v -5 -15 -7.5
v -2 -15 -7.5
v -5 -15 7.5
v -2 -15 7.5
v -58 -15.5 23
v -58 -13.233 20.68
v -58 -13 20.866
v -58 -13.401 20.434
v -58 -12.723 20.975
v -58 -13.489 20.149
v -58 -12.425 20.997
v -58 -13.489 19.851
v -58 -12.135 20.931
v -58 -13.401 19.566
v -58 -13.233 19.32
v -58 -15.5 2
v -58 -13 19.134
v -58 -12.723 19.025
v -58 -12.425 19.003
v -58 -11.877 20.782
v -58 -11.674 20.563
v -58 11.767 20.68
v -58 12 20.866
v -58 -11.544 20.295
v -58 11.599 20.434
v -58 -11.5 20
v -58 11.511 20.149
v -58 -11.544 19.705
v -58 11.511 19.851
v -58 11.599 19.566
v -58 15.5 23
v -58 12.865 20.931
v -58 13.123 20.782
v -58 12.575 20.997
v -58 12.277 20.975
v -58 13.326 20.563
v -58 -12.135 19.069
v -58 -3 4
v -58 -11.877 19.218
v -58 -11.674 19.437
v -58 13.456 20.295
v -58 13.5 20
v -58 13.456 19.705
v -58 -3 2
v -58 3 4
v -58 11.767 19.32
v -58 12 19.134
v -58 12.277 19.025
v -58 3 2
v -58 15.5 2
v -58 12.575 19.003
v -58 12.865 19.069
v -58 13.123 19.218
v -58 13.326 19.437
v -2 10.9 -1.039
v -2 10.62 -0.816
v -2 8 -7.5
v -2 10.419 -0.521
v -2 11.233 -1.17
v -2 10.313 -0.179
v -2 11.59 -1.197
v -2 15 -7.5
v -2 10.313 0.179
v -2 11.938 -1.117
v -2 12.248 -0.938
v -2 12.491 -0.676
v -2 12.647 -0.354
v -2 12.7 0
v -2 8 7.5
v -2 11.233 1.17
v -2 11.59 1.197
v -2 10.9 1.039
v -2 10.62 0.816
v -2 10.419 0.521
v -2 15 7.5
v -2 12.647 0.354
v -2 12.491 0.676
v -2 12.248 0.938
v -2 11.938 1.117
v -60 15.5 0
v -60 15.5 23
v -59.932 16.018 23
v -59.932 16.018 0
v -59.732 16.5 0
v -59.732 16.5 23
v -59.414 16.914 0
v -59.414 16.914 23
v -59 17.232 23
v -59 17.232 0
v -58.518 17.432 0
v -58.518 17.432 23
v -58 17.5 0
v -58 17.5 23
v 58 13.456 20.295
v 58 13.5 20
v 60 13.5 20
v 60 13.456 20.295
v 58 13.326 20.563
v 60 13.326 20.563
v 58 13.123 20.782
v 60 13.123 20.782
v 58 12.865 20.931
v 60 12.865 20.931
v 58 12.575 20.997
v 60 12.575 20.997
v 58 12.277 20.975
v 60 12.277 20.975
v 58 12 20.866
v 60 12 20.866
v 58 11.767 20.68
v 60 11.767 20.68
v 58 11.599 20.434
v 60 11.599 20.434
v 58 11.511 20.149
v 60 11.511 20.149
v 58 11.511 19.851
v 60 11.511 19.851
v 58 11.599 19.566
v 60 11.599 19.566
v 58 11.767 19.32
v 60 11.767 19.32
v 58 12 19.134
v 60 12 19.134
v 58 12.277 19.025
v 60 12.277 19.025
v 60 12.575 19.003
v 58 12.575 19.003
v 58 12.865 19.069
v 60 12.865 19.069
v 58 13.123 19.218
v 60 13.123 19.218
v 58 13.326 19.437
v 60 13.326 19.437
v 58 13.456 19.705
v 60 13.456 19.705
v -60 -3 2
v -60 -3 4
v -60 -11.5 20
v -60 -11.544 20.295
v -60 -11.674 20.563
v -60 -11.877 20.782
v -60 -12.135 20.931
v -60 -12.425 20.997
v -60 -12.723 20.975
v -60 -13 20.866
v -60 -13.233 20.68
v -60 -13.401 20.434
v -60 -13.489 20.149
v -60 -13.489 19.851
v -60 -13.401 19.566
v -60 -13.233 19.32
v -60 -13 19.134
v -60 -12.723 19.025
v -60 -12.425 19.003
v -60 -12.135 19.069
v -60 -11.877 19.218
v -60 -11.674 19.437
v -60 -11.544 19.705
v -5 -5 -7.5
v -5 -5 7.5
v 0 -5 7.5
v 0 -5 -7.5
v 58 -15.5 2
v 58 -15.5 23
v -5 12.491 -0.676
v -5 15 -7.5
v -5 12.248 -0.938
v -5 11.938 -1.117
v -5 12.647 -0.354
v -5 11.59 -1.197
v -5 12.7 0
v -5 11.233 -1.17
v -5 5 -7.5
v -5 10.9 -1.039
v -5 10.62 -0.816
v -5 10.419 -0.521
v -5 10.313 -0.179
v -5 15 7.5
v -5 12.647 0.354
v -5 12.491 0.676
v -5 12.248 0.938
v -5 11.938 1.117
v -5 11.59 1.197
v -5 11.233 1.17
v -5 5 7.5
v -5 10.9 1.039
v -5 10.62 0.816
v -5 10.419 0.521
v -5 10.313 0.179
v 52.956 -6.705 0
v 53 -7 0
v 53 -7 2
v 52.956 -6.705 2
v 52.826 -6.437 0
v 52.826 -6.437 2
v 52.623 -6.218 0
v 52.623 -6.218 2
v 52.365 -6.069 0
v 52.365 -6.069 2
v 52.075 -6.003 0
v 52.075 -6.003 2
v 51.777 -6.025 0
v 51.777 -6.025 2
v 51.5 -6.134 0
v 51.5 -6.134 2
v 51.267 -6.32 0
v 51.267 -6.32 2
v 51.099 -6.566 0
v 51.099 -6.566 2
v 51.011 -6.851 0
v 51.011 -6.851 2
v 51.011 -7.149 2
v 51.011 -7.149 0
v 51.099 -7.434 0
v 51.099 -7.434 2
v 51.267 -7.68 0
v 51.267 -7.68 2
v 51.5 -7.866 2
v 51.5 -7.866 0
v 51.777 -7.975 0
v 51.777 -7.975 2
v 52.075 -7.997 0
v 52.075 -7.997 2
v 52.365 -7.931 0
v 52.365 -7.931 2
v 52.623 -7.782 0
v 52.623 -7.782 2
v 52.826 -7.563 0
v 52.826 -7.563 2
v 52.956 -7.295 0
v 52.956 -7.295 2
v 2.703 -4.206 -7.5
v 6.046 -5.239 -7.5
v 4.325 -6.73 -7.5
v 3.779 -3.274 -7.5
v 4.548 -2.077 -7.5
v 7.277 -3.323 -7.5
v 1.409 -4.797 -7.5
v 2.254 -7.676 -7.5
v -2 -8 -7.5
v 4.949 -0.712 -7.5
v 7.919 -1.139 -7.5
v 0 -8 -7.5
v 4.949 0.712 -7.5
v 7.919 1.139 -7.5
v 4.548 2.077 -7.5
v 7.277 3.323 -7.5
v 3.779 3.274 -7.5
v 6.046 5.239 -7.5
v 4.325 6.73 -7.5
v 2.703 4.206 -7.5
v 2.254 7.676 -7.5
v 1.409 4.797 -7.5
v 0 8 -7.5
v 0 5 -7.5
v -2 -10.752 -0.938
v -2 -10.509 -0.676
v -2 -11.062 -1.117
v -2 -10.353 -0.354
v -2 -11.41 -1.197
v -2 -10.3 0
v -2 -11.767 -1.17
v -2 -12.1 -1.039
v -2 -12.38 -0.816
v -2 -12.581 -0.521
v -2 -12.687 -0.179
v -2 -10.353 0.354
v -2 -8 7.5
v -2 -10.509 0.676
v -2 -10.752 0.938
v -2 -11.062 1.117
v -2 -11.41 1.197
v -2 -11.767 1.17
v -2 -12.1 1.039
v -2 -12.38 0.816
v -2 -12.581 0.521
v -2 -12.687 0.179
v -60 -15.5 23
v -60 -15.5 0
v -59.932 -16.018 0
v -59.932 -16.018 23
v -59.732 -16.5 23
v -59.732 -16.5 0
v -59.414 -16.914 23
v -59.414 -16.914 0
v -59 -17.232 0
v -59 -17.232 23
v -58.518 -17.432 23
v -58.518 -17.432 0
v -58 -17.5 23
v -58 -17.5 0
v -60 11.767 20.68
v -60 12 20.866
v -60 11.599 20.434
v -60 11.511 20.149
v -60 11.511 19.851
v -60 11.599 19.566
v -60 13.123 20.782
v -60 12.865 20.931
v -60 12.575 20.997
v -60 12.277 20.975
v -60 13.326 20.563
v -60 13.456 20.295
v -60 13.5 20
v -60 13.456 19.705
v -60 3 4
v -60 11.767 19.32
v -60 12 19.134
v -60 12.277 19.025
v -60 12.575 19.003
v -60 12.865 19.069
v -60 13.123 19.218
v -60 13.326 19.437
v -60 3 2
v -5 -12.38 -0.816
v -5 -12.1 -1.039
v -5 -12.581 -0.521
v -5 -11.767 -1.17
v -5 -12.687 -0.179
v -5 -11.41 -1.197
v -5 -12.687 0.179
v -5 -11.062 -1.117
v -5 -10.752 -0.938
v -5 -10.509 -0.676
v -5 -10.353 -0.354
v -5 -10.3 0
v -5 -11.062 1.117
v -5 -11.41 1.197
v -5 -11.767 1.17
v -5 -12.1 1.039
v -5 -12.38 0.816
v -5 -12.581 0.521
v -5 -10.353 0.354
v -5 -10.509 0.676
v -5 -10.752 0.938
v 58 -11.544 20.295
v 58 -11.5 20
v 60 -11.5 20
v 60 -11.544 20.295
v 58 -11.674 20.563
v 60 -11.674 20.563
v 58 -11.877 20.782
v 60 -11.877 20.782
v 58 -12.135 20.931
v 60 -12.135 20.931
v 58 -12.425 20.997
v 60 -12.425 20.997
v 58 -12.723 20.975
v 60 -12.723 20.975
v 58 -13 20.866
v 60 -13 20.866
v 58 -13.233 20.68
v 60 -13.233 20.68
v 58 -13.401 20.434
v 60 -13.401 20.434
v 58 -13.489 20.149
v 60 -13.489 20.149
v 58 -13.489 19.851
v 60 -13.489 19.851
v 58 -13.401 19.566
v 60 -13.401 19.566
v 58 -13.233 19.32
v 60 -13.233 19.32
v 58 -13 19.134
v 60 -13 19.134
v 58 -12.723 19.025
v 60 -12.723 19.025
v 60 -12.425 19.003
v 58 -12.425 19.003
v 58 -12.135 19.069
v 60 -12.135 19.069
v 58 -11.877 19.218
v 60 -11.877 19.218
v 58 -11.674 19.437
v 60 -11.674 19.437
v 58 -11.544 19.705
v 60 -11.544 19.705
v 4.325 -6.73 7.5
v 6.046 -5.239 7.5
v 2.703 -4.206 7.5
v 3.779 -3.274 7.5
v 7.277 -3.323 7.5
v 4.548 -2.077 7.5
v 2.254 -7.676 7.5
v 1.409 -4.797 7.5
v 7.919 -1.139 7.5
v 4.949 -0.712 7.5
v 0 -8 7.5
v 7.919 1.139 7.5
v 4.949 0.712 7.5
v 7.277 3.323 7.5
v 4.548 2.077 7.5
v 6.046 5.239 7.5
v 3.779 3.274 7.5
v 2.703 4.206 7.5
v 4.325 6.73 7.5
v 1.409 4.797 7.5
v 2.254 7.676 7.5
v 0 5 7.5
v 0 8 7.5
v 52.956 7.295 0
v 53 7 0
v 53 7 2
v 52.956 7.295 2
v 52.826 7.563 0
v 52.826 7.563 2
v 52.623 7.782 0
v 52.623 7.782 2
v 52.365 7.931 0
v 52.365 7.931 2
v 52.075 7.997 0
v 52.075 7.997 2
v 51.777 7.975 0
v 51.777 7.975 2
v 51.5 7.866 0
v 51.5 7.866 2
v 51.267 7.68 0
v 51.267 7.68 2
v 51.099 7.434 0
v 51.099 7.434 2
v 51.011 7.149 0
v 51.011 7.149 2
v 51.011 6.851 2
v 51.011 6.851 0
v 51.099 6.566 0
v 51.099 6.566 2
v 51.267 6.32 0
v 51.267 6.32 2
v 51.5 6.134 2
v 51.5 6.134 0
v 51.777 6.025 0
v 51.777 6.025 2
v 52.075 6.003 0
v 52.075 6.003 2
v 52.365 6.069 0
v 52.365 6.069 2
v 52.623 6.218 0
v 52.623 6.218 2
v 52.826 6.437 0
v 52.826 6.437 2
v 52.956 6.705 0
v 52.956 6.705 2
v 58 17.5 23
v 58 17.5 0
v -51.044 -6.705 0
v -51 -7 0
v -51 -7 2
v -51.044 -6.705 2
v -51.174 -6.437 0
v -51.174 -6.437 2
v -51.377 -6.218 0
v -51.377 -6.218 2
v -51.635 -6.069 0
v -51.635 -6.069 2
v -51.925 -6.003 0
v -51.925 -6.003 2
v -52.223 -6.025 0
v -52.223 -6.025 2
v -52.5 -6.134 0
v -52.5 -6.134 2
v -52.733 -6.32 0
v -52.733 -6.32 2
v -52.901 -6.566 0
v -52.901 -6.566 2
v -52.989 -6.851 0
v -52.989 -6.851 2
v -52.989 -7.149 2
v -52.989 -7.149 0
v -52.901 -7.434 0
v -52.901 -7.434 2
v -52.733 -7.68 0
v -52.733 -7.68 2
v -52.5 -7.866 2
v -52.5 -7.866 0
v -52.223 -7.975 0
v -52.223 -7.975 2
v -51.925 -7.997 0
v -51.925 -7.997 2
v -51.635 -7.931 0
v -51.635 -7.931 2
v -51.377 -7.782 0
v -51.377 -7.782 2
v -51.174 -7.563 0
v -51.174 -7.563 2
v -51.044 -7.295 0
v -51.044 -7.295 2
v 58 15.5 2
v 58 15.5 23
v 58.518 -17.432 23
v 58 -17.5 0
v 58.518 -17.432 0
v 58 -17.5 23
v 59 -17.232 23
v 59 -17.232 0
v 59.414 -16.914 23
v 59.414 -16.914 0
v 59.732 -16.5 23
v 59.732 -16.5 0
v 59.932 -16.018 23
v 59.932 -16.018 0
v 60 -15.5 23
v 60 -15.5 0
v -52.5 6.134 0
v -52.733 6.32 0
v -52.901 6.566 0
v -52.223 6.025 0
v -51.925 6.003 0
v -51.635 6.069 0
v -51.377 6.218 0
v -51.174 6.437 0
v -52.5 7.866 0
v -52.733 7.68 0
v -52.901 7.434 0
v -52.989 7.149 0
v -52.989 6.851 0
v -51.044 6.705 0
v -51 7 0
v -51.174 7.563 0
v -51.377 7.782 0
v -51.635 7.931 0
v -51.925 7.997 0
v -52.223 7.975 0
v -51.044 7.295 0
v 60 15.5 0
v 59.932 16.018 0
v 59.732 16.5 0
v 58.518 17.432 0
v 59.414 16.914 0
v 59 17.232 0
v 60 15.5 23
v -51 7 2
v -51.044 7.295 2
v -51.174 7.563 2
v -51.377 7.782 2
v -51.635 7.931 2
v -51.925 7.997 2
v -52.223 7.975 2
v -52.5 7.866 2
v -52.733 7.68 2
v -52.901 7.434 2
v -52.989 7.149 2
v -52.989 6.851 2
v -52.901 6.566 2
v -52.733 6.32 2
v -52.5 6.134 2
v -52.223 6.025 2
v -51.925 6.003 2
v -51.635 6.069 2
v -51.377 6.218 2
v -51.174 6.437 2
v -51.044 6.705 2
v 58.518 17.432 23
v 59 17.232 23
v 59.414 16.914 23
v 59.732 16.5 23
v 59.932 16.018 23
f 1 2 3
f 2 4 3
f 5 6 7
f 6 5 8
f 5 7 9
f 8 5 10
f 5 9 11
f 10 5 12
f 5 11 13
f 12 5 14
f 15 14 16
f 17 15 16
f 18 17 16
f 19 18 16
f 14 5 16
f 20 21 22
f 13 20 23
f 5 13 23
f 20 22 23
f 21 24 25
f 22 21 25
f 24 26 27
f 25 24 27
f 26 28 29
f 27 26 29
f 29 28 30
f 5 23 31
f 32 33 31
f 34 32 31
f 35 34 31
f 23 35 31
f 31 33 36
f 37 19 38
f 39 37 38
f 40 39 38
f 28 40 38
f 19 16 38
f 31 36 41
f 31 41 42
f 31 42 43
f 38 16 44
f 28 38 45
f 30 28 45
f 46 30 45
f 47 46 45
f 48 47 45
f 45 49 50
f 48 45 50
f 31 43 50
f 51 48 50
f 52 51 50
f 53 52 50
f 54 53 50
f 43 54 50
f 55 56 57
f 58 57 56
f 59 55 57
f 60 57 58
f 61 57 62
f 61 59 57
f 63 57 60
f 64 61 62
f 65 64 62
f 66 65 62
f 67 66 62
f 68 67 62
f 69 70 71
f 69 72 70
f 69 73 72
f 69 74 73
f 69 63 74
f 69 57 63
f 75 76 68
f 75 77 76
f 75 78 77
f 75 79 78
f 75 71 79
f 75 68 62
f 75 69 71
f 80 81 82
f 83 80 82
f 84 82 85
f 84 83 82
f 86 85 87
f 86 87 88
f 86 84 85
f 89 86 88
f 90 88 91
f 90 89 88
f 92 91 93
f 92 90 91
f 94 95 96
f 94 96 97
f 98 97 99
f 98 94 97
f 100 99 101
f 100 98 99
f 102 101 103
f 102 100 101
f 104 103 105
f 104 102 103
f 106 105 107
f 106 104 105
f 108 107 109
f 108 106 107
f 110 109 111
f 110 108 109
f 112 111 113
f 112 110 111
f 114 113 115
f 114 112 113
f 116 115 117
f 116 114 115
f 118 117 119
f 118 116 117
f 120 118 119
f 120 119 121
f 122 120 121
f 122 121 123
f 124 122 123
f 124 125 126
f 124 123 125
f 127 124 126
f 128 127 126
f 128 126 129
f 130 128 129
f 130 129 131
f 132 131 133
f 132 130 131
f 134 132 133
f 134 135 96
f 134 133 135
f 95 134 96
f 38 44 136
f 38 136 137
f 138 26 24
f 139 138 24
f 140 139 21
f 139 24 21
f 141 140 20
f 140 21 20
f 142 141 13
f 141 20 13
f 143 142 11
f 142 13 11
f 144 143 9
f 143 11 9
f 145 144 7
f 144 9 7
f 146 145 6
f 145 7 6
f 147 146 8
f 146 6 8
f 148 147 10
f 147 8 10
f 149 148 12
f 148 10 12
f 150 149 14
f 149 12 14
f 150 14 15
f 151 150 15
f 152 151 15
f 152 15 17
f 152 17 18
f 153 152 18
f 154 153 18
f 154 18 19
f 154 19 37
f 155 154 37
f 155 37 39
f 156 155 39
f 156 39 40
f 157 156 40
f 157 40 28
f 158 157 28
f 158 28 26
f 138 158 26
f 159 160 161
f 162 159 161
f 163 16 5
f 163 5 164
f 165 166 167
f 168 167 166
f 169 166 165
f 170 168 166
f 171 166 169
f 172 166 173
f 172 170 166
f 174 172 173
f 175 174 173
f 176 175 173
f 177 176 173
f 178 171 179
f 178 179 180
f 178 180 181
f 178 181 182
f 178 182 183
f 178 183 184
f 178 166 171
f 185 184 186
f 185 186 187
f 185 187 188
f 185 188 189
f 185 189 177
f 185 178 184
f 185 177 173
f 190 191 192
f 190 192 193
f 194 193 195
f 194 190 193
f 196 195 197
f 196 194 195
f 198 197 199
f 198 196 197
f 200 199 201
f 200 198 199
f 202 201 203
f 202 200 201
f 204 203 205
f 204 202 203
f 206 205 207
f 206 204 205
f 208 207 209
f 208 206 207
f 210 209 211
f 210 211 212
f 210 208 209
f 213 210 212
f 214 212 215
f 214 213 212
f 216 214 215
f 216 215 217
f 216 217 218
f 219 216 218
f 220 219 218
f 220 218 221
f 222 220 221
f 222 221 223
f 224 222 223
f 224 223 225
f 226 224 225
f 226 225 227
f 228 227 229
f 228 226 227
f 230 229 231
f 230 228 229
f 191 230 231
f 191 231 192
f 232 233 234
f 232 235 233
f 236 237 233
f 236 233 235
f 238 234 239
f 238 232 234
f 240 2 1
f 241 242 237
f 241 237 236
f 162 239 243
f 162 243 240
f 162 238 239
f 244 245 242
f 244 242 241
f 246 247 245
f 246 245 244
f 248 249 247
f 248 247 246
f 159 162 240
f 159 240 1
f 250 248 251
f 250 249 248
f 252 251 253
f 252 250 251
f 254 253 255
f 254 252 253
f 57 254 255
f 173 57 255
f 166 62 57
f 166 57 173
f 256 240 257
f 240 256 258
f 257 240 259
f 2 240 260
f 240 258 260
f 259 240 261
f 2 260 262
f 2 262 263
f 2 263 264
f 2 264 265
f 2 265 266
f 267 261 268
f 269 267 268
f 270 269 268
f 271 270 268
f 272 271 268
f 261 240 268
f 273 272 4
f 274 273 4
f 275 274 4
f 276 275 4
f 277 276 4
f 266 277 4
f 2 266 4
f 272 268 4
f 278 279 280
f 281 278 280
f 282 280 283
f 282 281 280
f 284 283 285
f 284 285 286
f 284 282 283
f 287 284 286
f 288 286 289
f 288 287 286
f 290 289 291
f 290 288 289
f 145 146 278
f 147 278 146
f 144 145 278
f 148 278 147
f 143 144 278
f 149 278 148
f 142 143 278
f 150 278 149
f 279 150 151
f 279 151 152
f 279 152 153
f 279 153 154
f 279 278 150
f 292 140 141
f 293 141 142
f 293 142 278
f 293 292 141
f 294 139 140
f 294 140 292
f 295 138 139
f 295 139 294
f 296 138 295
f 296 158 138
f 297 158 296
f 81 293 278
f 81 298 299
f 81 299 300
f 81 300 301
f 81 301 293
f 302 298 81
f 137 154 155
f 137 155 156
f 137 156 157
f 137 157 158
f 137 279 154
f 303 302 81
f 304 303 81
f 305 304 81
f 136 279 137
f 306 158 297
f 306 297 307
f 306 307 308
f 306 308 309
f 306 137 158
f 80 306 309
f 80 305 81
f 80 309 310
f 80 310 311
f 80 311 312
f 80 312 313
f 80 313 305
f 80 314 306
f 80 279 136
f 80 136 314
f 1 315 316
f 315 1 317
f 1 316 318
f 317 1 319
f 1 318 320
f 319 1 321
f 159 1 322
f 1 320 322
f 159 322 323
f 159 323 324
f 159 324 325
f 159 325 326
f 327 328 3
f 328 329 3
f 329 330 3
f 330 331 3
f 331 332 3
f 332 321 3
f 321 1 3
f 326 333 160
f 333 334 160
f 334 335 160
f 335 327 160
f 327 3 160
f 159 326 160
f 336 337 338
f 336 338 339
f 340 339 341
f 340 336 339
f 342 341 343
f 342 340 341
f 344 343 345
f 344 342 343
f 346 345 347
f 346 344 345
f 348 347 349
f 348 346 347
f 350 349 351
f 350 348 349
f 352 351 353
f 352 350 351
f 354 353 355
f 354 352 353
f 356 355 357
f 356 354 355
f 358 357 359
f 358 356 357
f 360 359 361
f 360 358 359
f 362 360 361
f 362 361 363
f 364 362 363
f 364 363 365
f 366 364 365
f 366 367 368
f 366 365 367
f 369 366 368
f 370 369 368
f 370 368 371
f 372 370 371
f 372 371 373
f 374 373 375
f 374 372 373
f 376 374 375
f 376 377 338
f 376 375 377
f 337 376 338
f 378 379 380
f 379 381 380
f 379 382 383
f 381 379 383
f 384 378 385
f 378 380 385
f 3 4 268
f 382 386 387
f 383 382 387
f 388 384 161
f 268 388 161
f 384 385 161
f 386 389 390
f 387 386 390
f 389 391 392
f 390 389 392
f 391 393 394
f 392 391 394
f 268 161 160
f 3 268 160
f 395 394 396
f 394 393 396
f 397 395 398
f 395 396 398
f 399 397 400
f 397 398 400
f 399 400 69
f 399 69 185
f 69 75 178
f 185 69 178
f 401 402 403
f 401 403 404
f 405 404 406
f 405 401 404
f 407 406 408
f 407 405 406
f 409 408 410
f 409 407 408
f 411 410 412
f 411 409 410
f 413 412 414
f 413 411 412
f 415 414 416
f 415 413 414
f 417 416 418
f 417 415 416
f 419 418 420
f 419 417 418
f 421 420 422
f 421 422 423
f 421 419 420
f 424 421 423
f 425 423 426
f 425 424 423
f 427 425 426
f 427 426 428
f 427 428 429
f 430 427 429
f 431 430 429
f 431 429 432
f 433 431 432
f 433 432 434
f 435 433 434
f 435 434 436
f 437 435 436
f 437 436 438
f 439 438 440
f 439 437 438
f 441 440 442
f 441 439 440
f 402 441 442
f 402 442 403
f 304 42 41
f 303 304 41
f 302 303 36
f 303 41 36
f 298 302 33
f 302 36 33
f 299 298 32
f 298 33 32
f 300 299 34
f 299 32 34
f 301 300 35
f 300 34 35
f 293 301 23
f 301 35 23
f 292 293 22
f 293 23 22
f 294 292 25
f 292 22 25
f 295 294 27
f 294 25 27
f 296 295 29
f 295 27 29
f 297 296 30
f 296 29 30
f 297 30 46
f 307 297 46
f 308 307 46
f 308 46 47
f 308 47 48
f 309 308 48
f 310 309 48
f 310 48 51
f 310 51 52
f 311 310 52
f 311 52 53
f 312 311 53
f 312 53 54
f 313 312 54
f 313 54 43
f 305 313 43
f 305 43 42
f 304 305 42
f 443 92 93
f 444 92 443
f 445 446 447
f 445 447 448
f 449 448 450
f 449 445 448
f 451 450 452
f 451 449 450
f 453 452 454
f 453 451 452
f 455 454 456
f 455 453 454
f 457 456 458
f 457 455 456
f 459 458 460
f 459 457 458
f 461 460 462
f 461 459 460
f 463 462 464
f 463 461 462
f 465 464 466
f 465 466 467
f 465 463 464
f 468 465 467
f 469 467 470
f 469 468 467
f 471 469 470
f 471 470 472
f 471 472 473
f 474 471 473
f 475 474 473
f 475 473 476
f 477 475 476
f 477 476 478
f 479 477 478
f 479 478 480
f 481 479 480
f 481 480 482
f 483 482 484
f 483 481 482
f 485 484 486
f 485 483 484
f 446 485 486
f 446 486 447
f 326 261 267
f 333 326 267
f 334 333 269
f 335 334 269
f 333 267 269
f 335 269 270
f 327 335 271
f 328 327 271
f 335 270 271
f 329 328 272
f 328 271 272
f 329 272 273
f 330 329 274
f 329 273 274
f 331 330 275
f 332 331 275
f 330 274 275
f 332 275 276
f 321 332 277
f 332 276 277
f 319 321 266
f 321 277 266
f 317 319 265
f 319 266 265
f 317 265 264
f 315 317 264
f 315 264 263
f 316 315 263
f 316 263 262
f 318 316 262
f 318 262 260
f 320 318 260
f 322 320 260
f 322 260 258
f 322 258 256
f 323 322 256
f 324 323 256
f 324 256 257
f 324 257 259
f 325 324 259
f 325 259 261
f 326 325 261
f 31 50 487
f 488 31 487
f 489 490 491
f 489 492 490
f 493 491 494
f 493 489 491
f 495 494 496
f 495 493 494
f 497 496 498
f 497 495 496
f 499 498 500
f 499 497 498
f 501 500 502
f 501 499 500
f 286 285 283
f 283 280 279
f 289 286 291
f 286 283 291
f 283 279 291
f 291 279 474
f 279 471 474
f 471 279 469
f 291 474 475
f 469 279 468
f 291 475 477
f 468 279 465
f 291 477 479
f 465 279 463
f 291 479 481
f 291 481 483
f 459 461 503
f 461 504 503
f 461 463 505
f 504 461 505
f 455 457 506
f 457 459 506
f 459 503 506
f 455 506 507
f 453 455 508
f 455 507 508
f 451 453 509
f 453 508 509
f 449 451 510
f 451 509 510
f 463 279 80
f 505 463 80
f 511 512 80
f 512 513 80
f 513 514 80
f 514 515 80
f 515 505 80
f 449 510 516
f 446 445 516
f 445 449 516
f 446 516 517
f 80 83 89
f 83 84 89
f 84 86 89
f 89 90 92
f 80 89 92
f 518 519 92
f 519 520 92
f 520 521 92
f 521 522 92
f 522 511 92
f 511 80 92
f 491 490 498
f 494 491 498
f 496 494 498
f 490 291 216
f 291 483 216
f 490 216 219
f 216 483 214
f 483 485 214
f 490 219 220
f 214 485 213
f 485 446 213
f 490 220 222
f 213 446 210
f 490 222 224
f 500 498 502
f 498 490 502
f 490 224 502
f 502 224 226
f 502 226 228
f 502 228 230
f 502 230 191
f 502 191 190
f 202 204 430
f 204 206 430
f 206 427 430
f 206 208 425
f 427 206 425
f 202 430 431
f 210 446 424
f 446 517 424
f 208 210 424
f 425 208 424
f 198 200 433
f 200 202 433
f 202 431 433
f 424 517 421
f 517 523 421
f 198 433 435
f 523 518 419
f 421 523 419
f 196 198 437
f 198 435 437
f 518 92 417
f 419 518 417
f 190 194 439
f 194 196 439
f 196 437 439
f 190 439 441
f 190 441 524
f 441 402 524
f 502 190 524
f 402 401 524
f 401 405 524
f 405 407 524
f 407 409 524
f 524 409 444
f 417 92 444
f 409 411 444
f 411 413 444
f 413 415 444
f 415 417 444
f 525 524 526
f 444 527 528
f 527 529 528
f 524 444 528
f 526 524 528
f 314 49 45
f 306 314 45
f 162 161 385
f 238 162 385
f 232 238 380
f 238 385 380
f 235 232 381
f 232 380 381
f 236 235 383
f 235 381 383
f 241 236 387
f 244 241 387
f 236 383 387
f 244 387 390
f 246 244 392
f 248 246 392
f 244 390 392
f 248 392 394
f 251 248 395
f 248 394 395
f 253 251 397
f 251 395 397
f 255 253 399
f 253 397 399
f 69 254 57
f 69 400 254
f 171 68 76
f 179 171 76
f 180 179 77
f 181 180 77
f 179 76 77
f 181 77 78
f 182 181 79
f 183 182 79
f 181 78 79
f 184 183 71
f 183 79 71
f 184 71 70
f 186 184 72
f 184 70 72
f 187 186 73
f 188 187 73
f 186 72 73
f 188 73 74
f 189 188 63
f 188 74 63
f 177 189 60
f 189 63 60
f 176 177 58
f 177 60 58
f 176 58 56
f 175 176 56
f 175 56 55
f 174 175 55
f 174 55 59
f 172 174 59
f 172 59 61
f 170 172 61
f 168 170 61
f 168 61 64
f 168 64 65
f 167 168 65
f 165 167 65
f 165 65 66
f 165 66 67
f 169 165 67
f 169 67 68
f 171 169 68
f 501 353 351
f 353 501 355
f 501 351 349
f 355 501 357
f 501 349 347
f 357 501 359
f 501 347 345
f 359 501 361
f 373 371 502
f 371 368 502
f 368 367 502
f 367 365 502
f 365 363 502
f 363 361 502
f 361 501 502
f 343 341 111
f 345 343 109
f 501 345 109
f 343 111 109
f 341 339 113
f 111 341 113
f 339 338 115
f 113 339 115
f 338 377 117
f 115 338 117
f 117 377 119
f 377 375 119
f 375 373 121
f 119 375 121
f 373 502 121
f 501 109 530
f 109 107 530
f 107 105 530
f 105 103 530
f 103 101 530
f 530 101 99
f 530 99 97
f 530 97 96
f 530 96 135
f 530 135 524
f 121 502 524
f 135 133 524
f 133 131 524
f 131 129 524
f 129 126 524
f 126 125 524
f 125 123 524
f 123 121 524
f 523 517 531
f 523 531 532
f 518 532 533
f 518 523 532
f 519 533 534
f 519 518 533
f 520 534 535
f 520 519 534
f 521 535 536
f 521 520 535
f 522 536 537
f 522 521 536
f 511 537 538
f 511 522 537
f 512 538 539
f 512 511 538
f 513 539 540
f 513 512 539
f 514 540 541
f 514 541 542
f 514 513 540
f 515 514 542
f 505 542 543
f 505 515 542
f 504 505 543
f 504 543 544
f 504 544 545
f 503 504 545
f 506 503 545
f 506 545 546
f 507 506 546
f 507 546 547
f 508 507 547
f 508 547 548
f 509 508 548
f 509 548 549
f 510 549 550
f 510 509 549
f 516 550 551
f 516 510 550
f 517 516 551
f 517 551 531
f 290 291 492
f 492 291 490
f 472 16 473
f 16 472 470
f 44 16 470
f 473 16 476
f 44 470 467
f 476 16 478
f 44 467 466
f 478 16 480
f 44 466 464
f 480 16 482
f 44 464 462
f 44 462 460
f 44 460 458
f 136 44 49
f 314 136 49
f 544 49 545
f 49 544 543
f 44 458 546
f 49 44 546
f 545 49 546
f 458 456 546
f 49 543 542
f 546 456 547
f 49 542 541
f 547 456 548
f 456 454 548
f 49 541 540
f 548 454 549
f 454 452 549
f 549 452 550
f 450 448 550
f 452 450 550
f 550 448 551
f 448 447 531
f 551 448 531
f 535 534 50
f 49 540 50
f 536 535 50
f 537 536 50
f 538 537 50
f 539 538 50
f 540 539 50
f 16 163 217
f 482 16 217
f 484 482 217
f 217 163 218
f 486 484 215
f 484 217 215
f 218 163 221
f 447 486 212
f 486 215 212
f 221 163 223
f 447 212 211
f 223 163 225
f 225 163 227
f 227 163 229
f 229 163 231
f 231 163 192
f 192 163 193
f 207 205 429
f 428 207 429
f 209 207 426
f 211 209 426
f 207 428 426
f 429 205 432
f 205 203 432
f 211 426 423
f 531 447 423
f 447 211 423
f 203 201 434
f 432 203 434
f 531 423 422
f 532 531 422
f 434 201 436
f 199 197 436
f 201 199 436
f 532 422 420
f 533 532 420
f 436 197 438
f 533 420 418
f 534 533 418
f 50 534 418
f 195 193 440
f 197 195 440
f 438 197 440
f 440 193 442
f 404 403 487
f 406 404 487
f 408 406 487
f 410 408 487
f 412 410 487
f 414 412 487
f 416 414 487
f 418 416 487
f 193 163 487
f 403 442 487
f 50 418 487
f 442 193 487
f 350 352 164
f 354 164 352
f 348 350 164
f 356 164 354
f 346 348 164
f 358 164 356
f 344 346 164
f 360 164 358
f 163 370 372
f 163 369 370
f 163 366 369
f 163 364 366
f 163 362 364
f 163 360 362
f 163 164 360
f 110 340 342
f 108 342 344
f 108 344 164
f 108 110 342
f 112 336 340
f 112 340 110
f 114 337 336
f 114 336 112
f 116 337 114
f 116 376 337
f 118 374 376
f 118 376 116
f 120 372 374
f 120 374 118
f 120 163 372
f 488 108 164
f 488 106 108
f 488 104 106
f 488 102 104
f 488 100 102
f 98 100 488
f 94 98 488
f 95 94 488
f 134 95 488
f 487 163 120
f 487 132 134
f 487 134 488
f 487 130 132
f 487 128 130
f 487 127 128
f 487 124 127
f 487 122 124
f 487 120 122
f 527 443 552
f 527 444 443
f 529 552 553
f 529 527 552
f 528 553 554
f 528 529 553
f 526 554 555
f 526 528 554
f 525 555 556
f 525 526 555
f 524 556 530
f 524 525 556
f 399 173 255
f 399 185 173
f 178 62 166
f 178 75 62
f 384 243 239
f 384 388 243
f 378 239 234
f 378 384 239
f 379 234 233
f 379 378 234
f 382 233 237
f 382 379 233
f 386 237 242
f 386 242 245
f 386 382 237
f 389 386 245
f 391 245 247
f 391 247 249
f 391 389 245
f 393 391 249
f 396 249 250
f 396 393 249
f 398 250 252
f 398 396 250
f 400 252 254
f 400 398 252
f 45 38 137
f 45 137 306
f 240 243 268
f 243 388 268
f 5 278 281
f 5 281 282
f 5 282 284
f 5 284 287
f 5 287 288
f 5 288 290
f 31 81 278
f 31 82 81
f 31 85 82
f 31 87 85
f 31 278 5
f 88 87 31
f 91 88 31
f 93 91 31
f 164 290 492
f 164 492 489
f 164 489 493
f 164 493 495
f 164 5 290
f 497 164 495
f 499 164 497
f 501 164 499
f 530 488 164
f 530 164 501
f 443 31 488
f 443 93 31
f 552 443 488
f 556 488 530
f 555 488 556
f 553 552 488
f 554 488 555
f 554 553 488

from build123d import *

# Parameters (mm, degrees)
SKETCH_W        = 120
SKETCH_H        = 35
SKETCH_R        = 1
PAD_DEPTH       = 2
SKETCH001_W     = 120
SKETCH001_H     = 35
SKETCH001_W_2   = 116
SKETCH001_H_2   = 31
PAD001_DEPTH    = 23
SKETCH002_R     = 1
SKETCH002_W     = 6
SKETCH002_H     = 2
POCKET_DEPTH    = 60.001
SKETCH003_R     = 1
POCKET001_DEPTH = 60.001
FILLET_R        = 2
PAD002_DEPTH    = 7.5
SKETCH005_R     = 1.2
POCKET002_DEPTH = 5.001


with BuildPart() as body:
    # Sketch → Pad (new body)
    with BuildSketch(Plane.XY):
        Rectangle(SKETCH_W, SKETCH_H)
        with Locations((-52, 7)):
            Circle(SKETCH_R, mode=Mode.SUBTRACT)
        with Locations((-52, -7)):
            Circle(SKETCH_R, mode=Mode.SUBTRACT)
        with Locations((52, 7)):
            Circle(SKETCH_R, mode=Mode.SUBTRACT)
        with Locations((52, -7)):
            Circle(SKETCH_R, mode=Mode.SUBTRACT)
    extrude(amount=PAD_DEPTH)

    # Sketch001 → Pad001 (join)
    with BuildSketch(Plane.XY):
        Rectangle(SKETCH001_W, SKETCH001_H)
        Rectangle(SKETCH001_W_2, SKETCH001_H_2, mode=Mode.SUBTRACT)
    extrude(amount=PAD001_DEPTH)

    # Sketch002 → Pocket (cut, through all)
    with BuildSketch(Plane.YZ):
        with Locations((-12.5, 20)):
            Circle(SKETCH002_R)
        with Locations((12.5, 20)):
            Circle(SKETCH002_R)
        with Locations((0, 3)):
            Rectangle(SKETCH002_W, SKETCH002_H)
    extrude(amount=-POCKET_DEPTH, mode=Mode.SUBTRACT)

    # Sketch003 → Pocket001 (cut, through all)
    with BuildSketch(Plane.YZ):
        with Locations((-12.5, 20)):
            Circle(SKETCH003_R)
        with Locations((12.5, 20)):
            Circle(SKETCH003_R)
    extrude(amount=POCKET001_DEPTH, mode=Mode.SUBTRACT)

    # Fillet
    fillet_edges = [body.edges().sort_by_distance(p)[0] for p in [
        (-60, 17.5, 11.5),
        (-60, -17.5, 11.5),
        (60, -17.5, 11.5),
        (60, 17.5, 11.5),
    ]]
    fillet(fillet_edges, radius=FILLET_R)


with BuildPart() as body001:
    # Sketch004 → Pad002 (new body, symmetric)
    with BuildSketch(Plane.XY):
        with BuildLine():
            ThreePointArc((0, -5), (5, 0), (0, 5))
            Line((-5, 5), (0, 5))
            Line((-5, 15), (-5, 5))
            Line((-2, 15), (-5, 15))
            Line((-2, 8), (-2, 15))
            Line((0, 8), (-2, 8))
            ThreePointArc((0, -8), (8, 0), (0, 8))
            Line((0, -8), (-2, -8))
            Line((-2, -8), (-2, -15))
            Line((-2, -15), (-5, -15))
            Line((-5, -15), (-5, -5))
            Line((-5, -5), (0, -5))
        make_face()
    extrude(amount=PAD002_DEPTH, both=True)

    # Sketch005 → Pocket002 (cut, through all)
    with BuildSketch(Plane.YZ):
        with Locations((-11.5, 0)):
            Circle(SKETCH005_R)
        with Locations((11.5, 0)):
            Circle(SKETCH005_R)
    extrude(amount=-POCKET002_DEPTH, mode=Mode.SUBTRACT)


solid = Compound([body.part, body001.part])
